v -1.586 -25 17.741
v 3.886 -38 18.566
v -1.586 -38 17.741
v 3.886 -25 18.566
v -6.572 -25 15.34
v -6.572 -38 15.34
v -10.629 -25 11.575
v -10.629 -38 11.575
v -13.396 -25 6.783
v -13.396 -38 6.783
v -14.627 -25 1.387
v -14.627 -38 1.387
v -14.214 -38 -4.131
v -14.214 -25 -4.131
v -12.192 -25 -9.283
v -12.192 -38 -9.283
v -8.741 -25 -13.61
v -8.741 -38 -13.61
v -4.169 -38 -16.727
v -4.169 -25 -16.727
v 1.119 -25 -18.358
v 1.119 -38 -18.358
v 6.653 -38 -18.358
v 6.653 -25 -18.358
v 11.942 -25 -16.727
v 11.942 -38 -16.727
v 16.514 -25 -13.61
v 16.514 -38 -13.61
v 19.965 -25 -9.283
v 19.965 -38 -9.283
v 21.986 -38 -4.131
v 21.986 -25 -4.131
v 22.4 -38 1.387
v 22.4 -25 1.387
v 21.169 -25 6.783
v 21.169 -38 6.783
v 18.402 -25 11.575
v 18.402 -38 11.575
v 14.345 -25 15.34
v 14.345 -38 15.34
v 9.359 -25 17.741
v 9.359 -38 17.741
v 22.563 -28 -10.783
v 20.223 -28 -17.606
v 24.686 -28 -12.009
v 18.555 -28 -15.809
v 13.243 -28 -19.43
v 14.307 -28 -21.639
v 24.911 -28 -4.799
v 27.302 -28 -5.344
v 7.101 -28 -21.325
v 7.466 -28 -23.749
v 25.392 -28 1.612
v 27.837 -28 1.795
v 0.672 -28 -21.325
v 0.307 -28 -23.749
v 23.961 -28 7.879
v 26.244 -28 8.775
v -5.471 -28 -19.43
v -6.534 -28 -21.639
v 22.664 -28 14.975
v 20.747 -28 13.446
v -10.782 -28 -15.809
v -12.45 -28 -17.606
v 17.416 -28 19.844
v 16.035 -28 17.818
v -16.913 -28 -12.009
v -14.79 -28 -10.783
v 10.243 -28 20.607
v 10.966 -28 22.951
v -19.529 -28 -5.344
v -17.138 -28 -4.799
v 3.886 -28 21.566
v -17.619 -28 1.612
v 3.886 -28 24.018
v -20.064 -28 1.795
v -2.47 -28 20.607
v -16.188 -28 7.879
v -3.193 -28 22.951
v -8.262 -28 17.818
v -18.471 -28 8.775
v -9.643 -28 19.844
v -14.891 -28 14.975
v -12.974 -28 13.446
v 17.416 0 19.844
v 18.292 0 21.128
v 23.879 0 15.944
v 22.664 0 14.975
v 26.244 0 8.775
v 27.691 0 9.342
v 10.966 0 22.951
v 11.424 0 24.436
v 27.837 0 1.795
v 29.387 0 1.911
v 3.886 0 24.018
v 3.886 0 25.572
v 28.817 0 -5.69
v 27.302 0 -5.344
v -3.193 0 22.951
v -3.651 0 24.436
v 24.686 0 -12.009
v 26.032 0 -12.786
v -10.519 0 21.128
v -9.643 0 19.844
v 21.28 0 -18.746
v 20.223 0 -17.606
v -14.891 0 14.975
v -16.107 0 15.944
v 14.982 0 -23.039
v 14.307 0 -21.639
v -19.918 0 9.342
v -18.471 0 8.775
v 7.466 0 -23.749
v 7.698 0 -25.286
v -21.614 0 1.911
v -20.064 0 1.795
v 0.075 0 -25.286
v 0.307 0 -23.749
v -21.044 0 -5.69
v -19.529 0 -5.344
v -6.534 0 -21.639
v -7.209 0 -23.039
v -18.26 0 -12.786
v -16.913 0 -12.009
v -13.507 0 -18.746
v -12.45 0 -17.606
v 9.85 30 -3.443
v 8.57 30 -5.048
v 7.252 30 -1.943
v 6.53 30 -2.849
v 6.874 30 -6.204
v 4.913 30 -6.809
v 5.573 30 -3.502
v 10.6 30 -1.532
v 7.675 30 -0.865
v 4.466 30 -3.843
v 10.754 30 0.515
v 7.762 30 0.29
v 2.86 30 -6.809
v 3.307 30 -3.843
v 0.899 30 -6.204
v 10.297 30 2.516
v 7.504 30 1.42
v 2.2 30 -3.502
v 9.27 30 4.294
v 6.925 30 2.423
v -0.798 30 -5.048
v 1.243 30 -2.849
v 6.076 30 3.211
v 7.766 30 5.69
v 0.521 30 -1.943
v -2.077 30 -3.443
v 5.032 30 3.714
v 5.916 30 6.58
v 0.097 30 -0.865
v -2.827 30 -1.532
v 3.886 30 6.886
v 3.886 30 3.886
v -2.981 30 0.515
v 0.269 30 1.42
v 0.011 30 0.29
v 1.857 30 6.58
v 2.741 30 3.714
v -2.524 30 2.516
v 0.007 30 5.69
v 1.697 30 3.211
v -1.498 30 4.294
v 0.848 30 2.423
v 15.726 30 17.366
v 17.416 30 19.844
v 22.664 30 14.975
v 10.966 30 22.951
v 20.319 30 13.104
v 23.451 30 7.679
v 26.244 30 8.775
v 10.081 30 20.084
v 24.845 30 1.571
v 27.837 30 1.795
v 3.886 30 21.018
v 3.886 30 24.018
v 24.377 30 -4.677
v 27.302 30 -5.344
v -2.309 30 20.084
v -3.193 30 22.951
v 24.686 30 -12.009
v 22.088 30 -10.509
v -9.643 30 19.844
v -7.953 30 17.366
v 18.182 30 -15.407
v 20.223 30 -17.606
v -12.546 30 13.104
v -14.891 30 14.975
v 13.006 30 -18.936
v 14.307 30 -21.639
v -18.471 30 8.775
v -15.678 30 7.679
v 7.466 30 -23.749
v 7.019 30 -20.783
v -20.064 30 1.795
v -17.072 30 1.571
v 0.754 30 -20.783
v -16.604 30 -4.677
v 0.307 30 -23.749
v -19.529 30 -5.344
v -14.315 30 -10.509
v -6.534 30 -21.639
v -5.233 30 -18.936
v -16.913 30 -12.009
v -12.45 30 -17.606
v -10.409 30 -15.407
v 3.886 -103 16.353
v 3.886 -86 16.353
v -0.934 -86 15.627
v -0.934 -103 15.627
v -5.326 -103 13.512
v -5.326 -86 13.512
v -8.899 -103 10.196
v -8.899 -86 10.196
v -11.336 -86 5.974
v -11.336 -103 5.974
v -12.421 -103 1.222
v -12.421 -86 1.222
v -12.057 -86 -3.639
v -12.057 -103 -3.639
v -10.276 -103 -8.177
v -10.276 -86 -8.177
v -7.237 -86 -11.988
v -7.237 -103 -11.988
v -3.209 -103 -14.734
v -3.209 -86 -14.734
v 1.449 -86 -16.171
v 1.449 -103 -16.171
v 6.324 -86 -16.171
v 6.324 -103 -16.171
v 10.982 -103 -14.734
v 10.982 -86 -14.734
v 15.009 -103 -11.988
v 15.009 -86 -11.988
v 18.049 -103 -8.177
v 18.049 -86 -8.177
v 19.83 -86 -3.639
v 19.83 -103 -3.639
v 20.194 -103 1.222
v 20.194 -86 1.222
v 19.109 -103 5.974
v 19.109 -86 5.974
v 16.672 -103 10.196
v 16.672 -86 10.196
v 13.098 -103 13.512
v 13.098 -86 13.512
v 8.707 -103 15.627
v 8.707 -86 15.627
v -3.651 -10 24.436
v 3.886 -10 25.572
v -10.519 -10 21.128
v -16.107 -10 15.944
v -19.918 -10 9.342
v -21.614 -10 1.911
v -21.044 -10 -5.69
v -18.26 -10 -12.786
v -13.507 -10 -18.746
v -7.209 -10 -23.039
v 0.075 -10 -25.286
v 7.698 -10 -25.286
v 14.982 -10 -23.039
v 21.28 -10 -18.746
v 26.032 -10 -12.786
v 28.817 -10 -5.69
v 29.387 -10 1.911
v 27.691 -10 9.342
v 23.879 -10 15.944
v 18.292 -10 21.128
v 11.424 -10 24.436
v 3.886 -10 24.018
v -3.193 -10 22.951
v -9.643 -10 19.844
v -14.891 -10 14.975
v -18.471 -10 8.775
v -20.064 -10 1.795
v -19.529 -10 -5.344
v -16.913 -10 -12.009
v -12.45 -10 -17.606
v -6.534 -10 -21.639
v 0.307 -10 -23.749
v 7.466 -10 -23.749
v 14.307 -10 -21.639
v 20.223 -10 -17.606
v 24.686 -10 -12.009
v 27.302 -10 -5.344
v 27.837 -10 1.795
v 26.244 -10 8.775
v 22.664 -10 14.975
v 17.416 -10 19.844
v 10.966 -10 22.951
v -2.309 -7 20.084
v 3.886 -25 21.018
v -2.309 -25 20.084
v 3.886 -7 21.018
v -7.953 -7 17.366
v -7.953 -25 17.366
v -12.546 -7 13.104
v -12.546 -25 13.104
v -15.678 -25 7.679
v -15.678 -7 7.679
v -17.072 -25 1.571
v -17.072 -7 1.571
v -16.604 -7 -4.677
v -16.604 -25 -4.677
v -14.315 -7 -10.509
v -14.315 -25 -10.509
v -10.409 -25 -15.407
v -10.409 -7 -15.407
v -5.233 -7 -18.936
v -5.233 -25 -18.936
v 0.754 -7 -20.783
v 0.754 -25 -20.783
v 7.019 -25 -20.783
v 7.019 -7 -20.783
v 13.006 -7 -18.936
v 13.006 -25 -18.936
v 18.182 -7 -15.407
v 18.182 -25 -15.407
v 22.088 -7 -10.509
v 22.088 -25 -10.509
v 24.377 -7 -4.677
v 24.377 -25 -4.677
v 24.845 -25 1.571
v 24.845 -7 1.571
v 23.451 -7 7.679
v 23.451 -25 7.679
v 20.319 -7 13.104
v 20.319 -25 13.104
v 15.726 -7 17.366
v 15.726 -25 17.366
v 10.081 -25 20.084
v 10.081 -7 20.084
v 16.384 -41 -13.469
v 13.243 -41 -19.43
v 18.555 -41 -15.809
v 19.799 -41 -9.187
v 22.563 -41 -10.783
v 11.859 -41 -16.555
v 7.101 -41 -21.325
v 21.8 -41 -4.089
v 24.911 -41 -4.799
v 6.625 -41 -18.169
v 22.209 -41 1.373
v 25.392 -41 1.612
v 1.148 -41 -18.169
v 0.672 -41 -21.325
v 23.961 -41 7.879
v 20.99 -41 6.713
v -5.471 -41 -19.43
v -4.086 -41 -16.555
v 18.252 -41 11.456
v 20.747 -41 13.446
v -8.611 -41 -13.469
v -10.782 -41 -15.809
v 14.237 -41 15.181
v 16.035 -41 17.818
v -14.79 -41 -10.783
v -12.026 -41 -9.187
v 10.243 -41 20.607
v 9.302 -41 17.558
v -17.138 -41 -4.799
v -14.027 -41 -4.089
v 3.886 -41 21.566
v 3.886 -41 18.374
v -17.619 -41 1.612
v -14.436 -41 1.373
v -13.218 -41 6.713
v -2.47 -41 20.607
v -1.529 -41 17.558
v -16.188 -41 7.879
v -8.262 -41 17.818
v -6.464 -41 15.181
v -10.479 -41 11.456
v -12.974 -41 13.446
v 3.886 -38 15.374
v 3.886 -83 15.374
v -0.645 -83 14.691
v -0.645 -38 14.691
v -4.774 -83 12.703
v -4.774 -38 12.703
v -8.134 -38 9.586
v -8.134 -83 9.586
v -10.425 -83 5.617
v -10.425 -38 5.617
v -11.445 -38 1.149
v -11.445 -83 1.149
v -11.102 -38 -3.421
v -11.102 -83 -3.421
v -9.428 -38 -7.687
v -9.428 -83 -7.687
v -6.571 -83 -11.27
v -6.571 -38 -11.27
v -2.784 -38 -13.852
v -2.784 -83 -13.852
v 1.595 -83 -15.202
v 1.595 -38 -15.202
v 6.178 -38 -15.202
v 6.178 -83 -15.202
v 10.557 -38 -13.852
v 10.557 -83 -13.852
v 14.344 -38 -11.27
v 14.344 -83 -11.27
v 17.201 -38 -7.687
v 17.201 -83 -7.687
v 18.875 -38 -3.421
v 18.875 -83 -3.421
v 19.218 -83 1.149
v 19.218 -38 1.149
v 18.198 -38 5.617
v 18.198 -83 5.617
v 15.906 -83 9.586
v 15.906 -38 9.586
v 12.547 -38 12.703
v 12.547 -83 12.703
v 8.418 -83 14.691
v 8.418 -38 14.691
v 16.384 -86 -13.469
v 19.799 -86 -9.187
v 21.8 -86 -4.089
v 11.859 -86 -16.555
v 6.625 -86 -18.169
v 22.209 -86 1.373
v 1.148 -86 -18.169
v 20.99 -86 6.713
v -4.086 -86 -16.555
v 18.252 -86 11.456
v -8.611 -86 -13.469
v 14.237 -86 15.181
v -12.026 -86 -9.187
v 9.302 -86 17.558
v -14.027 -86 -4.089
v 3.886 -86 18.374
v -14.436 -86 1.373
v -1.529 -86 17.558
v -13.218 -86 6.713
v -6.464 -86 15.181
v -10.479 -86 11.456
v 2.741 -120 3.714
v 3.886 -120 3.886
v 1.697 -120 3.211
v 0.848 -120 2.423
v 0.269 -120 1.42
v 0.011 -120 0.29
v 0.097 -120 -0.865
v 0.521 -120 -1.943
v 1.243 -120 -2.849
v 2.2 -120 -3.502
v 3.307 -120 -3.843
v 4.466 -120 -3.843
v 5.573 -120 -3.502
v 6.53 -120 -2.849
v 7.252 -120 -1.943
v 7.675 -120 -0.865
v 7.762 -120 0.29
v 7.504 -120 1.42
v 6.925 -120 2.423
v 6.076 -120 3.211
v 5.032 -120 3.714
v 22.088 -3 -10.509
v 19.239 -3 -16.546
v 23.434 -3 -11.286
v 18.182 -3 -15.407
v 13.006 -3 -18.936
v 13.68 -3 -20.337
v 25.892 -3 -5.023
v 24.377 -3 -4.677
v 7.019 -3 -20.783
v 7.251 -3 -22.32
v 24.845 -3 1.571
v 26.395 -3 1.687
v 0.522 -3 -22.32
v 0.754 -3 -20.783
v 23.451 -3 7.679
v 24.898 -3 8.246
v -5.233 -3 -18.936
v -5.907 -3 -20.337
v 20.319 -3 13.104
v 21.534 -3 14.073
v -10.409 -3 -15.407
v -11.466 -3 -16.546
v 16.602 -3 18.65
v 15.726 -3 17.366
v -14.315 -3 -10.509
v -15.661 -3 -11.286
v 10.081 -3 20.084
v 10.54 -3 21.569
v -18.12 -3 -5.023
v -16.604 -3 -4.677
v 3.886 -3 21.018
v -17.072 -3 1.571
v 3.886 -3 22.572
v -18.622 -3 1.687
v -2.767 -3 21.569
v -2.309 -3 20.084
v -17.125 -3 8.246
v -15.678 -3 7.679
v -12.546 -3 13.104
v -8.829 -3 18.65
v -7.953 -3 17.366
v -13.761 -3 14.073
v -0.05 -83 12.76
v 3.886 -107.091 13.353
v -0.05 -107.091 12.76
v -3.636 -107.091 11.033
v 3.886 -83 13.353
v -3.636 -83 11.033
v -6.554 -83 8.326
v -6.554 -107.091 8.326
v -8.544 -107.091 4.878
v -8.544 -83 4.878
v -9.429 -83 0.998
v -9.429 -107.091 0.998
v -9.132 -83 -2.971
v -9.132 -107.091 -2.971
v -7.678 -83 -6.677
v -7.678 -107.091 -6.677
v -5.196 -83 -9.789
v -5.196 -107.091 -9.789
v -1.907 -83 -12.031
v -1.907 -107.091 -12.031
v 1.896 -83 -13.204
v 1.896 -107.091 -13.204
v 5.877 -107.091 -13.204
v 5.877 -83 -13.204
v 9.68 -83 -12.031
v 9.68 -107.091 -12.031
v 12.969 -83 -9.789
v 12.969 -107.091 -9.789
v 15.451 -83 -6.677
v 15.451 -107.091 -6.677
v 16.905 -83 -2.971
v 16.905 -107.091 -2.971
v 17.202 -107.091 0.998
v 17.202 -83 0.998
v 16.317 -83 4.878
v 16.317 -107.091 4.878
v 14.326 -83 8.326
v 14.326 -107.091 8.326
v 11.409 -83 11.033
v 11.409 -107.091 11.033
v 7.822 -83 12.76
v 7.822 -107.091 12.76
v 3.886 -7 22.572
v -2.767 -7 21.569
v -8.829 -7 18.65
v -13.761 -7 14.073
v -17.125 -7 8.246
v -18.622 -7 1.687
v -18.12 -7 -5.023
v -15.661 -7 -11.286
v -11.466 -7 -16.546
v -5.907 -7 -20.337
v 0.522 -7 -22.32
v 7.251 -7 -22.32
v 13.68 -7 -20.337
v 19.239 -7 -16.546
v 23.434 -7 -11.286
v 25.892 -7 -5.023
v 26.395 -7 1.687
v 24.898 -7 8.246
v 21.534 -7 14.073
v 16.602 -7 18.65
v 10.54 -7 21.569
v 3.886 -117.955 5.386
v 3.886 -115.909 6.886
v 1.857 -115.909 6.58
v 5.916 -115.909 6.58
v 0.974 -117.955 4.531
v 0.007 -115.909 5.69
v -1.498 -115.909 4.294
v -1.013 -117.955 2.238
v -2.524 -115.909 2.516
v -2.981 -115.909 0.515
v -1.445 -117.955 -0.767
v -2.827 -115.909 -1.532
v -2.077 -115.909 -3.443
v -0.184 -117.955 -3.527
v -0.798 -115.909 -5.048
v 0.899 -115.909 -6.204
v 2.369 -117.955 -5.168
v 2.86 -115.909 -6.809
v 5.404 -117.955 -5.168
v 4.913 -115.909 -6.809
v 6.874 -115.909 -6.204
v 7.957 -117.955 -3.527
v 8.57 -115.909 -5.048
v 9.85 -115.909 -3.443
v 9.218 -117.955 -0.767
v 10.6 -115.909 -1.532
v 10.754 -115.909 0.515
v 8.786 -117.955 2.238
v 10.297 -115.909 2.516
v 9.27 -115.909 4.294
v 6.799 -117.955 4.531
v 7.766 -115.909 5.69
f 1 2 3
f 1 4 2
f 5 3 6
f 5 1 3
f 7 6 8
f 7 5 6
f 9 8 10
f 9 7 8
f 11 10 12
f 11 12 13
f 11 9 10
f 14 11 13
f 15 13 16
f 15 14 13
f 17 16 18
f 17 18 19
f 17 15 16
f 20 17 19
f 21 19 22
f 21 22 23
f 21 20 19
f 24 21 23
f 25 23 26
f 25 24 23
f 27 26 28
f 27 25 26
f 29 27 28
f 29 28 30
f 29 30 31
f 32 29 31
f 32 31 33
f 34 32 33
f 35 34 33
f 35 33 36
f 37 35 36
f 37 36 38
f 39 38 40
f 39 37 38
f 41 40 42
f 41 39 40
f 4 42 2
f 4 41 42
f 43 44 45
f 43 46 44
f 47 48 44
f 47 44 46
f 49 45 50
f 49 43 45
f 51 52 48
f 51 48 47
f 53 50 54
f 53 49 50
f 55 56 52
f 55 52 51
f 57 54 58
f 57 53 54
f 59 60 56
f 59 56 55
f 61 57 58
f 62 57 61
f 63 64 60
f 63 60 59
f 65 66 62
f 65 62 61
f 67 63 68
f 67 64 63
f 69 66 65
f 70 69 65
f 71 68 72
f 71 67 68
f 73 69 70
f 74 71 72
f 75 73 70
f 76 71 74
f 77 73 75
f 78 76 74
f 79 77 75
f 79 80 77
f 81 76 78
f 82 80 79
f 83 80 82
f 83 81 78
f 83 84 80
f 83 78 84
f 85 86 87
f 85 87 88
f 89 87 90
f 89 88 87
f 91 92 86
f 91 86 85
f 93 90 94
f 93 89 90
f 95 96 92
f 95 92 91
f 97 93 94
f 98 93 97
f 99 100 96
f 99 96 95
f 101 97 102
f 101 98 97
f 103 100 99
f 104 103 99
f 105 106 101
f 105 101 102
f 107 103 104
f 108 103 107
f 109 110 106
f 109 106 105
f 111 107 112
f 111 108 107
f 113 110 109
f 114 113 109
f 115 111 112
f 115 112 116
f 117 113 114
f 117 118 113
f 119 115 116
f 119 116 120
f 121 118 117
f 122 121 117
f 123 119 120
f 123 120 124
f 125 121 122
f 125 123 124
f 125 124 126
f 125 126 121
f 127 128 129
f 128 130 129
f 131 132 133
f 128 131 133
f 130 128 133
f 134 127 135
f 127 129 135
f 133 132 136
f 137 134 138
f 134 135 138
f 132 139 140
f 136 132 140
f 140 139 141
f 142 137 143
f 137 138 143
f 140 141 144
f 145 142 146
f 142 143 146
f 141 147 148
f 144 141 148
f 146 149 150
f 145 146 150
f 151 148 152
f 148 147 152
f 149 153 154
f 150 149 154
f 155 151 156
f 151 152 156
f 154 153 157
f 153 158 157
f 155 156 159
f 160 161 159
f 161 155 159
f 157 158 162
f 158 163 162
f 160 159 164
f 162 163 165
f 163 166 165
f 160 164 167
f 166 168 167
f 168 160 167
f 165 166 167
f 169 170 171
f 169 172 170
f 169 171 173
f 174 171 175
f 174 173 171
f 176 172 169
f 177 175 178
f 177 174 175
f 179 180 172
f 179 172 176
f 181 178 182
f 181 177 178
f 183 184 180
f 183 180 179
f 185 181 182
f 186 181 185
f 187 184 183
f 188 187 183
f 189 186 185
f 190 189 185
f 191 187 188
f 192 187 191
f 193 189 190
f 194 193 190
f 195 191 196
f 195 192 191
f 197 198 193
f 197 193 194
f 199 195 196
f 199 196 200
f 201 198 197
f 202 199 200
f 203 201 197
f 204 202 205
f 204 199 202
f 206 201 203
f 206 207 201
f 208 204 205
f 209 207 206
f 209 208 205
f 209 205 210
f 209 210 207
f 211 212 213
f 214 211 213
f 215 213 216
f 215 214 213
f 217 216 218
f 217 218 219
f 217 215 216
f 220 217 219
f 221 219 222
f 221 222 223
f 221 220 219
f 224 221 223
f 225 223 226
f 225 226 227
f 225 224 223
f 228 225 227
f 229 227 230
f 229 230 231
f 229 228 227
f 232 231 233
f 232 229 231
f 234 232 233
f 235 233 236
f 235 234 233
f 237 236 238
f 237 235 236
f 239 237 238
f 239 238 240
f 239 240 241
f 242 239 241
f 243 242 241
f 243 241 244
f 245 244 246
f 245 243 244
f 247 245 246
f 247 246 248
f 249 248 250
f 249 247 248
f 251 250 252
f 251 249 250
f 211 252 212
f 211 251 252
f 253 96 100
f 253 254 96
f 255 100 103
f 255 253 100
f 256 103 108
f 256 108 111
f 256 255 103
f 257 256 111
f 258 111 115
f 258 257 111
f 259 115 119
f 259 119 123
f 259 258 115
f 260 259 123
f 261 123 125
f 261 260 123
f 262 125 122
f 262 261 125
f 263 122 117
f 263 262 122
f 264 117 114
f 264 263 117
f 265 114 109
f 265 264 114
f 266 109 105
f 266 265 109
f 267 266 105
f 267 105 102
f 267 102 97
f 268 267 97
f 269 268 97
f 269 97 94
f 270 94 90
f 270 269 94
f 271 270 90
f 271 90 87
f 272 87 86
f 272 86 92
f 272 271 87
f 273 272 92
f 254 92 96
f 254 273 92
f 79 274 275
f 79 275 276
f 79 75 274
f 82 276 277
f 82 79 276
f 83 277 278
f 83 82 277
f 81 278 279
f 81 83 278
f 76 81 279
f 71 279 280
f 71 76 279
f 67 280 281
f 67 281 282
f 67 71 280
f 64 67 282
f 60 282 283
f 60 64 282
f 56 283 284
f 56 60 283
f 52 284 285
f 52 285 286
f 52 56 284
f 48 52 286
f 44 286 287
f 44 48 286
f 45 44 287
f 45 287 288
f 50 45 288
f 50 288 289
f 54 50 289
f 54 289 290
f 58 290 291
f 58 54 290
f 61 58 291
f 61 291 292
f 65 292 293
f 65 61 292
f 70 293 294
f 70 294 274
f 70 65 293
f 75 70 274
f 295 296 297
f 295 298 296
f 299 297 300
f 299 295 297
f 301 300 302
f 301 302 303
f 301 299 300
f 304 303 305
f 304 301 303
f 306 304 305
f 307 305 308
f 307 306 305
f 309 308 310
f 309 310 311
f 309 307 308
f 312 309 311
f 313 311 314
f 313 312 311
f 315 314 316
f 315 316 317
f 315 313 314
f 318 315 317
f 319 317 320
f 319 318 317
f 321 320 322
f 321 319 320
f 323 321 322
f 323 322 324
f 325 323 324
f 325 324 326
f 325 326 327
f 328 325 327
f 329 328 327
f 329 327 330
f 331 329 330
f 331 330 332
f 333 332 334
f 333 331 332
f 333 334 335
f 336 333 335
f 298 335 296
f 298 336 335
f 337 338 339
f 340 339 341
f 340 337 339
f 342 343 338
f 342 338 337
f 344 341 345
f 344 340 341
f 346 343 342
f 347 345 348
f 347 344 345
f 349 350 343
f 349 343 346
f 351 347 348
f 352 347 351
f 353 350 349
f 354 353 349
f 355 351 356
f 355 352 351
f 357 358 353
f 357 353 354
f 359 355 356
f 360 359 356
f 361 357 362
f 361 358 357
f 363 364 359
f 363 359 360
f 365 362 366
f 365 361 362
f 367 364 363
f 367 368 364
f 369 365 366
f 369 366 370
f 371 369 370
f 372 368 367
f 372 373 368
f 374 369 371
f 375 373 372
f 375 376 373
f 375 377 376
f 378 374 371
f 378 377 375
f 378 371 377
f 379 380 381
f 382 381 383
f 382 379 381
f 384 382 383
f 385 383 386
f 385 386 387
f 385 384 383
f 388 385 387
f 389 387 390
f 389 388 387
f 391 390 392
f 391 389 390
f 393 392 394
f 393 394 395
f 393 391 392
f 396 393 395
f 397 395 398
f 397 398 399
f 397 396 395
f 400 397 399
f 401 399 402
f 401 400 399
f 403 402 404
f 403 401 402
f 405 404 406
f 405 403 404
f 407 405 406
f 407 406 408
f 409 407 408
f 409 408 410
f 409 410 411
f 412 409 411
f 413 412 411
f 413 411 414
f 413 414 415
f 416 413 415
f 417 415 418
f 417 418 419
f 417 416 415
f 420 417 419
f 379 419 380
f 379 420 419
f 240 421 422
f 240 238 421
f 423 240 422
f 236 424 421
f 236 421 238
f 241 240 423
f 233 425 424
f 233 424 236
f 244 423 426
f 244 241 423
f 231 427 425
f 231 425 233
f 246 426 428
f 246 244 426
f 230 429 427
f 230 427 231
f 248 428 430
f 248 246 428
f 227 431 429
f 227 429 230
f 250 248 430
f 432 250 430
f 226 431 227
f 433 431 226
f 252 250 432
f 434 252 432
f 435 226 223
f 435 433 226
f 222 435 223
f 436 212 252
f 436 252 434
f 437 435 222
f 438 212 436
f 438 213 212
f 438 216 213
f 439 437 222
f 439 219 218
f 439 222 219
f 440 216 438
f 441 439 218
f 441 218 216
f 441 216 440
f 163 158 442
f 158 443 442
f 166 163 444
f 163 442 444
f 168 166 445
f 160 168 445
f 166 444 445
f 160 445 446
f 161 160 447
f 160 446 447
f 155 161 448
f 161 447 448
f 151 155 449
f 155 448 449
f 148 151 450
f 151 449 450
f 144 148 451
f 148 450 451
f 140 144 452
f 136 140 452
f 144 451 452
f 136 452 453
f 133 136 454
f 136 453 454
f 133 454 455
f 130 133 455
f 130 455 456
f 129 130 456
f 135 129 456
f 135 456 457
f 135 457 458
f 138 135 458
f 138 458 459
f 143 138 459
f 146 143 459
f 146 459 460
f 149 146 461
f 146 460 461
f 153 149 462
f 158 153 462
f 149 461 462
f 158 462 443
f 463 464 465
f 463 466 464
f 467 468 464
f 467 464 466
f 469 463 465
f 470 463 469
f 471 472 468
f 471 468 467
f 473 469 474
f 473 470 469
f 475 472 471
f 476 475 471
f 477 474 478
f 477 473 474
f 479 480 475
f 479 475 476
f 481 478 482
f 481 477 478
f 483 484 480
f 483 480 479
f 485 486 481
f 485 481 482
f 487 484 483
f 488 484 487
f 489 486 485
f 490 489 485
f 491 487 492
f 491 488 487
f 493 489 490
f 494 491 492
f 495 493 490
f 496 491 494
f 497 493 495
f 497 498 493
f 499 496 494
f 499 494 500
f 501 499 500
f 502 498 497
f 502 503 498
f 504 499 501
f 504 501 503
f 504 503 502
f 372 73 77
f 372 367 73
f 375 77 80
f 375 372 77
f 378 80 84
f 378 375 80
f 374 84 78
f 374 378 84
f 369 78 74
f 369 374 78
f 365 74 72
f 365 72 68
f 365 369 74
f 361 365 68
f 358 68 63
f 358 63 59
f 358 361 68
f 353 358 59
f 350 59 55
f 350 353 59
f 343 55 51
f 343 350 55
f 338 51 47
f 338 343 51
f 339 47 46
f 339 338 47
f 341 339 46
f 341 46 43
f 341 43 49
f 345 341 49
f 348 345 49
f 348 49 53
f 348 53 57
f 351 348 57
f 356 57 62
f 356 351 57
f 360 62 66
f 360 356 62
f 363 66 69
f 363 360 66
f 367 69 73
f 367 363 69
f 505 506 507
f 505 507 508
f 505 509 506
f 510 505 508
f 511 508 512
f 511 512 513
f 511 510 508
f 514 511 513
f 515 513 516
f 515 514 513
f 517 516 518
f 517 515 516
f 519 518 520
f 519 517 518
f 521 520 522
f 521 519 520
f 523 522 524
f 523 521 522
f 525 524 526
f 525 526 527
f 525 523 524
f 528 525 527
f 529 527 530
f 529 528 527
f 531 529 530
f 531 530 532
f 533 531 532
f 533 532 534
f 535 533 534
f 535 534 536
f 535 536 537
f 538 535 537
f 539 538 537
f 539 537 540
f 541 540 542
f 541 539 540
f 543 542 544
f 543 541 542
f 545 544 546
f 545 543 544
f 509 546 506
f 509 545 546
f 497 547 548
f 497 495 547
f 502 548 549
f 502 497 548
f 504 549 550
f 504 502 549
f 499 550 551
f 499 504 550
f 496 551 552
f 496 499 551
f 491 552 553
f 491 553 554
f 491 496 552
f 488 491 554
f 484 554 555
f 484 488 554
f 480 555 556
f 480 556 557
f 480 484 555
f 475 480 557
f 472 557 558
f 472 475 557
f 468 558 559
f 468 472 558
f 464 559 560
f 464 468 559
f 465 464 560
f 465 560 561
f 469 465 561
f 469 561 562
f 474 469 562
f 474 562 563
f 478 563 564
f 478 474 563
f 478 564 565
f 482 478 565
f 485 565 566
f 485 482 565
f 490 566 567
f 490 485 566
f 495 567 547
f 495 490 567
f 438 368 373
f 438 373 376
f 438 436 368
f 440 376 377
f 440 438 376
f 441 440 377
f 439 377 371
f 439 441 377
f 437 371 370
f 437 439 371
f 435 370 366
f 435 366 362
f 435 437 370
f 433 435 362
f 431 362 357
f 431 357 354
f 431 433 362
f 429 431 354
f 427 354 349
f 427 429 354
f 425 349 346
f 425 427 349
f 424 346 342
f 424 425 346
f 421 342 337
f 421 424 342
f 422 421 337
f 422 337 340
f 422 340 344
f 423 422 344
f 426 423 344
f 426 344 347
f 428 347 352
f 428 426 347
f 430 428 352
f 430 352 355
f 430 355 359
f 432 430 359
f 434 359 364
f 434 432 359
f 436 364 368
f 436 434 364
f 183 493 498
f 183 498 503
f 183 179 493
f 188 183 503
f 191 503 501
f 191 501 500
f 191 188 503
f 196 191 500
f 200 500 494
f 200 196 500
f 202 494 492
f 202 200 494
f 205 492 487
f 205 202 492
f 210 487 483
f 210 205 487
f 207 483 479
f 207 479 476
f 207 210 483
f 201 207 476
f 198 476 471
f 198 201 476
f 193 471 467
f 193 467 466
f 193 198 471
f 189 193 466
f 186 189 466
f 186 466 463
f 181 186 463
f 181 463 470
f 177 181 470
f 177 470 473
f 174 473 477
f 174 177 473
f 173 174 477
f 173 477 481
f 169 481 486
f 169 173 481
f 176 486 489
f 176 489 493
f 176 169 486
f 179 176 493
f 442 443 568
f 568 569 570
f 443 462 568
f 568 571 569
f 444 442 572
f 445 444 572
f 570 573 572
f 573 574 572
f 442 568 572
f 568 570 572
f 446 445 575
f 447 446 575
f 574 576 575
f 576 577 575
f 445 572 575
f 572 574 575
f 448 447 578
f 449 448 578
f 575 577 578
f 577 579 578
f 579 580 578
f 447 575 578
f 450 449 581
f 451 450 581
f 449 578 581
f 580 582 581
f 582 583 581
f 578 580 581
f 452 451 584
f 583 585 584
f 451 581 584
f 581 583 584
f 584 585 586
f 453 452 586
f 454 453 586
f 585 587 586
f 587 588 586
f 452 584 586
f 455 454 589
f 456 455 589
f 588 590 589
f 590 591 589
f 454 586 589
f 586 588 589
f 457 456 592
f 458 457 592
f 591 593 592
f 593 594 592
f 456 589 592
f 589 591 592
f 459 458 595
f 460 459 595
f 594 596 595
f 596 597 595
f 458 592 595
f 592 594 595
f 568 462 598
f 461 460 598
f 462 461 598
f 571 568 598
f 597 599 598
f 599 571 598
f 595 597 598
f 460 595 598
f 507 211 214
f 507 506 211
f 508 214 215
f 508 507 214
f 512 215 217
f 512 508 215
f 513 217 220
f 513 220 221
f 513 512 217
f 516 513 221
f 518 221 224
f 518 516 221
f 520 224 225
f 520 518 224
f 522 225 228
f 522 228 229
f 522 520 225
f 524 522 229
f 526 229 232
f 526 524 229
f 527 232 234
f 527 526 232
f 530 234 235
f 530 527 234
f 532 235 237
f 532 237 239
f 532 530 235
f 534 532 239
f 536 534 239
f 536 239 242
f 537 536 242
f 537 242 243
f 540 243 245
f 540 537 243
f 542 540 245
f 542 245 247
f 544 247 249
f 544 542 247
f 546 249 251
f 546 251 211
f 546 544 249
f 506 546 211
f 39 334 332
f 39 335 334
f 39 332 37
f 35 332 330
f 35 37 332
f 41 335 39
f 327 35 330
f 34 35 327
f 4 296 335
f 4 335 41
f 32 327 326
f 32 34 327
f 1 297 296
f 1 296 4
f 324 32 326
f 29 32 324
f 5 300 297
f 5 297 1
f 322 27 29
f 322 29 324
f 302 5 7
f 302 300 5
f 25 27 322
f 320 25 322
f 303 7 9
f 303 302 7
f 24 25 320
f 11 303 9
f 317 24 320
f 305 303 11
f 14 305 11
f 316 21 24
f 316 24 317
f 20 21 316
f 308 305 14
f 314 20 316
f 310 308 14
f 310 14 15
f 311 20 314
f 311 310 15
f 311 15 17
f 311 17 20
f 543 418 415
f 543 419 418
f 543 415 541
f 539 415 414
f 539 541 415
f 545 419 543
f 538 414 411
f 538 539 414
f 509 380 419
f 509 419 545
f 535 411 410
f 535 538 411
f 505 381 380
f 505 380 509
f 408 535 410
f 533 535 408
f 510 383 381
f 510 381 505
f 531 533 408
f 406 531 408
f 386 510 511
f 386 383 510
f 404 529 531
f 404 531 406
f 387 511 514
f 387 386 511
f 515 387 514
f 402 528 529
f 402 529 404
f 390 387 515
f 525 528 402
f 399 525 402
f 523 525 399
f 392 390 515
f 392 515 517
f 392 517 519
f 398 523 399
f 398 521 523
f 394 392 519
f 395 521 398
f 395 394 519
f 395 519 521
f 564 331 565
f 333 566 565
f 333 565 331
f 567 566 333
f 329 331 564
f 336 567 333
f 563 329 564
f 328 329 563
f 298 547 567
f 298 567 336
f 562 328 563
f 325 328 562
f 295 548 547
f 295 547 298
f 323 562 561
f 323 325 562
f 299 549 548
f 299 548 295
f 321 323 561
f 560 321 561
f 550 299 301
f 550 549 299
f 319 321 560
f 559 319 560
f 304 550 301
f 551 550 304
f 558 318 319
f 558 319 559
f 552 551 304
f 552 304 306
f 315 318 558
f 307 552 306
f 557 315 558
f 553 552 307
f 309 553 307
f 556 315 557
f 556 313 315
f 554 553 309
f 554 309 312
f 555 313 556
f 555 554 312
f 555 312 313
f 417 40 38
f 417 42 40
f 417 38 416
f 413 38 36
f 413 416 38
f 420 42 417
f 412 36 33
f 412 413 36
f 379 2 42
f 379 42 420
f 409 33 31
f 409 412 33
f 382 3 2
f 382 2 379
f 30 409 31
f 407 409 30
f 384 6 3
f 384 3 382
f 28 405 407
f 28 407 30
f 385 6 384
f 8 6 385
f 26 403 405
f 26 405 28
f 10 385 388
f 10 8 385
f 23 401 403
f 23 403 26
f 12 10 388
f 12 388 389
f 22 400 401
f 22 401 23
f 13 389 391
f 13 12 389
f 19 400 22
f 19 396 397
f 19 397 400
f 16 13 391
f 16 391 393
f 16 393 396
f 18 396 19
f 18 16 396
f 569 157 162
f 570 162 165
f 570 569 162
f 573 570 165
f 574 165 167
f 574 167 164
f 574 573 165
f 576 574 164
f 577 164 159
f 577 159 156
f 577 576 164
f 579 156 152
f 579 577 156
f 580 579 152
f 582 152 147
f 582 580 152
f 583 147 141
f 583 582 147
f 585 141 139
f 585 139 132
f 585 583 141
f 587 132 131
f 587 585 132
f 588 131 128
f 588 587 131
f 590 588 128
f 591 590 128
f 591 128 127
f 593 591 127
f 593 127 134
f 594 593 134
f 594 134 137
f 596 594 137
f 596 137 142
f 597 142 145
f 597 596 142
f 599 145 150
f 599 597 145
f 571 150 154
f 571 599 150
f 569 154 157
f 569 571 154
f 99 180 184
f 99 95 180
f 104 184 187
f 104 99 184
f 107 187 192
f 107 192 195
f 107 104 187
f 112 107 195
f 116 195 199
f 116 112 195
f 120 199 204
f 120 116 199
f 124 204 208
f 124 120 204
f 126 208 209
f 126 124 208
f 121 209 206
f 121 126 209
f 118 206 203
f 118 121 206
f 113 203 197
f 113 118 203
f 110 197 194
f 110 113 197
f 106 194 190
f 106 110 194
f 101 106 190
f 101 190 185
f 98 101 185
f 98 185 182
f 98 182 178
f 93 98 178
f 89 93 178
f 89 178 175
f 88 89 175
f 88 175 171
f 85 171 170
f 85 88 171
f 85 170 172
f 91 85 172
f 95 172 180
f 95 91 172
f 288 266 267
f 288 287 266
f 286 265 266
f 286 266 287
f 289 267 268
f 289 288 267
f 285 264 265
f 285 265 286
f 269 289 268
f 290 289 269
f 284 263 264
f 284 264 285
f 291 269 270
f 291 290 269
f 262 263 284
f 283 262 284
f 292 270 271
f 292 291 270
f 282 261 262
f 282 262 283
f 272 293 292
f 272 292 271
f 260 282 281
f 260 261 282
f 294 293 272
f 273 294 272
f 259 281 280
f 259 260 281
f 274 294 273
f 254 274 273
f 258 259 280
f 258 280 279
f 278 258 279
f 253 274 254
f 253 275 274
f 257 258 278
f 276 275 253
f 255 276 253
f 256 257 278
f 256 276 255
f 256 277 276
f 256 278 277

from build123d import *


with BuildPart() as part:
    # Sketch1 → Revolve8 (revolve)
    with BuildSketch(Plane.XY, mode=Mode.PRIVATE) as revolve8_sk:
        Polygon((-20.1311725, 30), (-20.1311725, 0), (-21.685493391, 0), (-21.685493391, -10), (-20.1311725, -10), (-20.1311725, -28), (-17.679129986, -28), (-17.679129986, -41), (-14.487787153, -41), (-14.487787153, -86), (-12.466786695, -86), (-12.466786695, -103), (-9.466786695, -107.090869704), (-9.466786695, -102.017880946), (-9.466786695, -83), (-11.487787153, -83), (-11.487787153, -38), (-14.679129986, -38), (-14.679129986, -25), (-17.1311725, -25), (-17.1311725, -7), (-18.685493391, -7), (-18.685493391, -3), (-17.1311725, -3), (-17.1311725, 27), (-17.1311725, 30), align=None)
        Polygon((0, 30), (0, -120), (-3, -115.909130296), (-3, -110.836141538), (-3, 27), (-3, 30), align=None)
    revolve(revolve8_sk.sketch.rotate(Axis((3.886409375, 30, 0), (0, -1, 0)), 270), axis=Axis((3.886409375, 30, 0), (0, -1, 0)))


solid = part.part
